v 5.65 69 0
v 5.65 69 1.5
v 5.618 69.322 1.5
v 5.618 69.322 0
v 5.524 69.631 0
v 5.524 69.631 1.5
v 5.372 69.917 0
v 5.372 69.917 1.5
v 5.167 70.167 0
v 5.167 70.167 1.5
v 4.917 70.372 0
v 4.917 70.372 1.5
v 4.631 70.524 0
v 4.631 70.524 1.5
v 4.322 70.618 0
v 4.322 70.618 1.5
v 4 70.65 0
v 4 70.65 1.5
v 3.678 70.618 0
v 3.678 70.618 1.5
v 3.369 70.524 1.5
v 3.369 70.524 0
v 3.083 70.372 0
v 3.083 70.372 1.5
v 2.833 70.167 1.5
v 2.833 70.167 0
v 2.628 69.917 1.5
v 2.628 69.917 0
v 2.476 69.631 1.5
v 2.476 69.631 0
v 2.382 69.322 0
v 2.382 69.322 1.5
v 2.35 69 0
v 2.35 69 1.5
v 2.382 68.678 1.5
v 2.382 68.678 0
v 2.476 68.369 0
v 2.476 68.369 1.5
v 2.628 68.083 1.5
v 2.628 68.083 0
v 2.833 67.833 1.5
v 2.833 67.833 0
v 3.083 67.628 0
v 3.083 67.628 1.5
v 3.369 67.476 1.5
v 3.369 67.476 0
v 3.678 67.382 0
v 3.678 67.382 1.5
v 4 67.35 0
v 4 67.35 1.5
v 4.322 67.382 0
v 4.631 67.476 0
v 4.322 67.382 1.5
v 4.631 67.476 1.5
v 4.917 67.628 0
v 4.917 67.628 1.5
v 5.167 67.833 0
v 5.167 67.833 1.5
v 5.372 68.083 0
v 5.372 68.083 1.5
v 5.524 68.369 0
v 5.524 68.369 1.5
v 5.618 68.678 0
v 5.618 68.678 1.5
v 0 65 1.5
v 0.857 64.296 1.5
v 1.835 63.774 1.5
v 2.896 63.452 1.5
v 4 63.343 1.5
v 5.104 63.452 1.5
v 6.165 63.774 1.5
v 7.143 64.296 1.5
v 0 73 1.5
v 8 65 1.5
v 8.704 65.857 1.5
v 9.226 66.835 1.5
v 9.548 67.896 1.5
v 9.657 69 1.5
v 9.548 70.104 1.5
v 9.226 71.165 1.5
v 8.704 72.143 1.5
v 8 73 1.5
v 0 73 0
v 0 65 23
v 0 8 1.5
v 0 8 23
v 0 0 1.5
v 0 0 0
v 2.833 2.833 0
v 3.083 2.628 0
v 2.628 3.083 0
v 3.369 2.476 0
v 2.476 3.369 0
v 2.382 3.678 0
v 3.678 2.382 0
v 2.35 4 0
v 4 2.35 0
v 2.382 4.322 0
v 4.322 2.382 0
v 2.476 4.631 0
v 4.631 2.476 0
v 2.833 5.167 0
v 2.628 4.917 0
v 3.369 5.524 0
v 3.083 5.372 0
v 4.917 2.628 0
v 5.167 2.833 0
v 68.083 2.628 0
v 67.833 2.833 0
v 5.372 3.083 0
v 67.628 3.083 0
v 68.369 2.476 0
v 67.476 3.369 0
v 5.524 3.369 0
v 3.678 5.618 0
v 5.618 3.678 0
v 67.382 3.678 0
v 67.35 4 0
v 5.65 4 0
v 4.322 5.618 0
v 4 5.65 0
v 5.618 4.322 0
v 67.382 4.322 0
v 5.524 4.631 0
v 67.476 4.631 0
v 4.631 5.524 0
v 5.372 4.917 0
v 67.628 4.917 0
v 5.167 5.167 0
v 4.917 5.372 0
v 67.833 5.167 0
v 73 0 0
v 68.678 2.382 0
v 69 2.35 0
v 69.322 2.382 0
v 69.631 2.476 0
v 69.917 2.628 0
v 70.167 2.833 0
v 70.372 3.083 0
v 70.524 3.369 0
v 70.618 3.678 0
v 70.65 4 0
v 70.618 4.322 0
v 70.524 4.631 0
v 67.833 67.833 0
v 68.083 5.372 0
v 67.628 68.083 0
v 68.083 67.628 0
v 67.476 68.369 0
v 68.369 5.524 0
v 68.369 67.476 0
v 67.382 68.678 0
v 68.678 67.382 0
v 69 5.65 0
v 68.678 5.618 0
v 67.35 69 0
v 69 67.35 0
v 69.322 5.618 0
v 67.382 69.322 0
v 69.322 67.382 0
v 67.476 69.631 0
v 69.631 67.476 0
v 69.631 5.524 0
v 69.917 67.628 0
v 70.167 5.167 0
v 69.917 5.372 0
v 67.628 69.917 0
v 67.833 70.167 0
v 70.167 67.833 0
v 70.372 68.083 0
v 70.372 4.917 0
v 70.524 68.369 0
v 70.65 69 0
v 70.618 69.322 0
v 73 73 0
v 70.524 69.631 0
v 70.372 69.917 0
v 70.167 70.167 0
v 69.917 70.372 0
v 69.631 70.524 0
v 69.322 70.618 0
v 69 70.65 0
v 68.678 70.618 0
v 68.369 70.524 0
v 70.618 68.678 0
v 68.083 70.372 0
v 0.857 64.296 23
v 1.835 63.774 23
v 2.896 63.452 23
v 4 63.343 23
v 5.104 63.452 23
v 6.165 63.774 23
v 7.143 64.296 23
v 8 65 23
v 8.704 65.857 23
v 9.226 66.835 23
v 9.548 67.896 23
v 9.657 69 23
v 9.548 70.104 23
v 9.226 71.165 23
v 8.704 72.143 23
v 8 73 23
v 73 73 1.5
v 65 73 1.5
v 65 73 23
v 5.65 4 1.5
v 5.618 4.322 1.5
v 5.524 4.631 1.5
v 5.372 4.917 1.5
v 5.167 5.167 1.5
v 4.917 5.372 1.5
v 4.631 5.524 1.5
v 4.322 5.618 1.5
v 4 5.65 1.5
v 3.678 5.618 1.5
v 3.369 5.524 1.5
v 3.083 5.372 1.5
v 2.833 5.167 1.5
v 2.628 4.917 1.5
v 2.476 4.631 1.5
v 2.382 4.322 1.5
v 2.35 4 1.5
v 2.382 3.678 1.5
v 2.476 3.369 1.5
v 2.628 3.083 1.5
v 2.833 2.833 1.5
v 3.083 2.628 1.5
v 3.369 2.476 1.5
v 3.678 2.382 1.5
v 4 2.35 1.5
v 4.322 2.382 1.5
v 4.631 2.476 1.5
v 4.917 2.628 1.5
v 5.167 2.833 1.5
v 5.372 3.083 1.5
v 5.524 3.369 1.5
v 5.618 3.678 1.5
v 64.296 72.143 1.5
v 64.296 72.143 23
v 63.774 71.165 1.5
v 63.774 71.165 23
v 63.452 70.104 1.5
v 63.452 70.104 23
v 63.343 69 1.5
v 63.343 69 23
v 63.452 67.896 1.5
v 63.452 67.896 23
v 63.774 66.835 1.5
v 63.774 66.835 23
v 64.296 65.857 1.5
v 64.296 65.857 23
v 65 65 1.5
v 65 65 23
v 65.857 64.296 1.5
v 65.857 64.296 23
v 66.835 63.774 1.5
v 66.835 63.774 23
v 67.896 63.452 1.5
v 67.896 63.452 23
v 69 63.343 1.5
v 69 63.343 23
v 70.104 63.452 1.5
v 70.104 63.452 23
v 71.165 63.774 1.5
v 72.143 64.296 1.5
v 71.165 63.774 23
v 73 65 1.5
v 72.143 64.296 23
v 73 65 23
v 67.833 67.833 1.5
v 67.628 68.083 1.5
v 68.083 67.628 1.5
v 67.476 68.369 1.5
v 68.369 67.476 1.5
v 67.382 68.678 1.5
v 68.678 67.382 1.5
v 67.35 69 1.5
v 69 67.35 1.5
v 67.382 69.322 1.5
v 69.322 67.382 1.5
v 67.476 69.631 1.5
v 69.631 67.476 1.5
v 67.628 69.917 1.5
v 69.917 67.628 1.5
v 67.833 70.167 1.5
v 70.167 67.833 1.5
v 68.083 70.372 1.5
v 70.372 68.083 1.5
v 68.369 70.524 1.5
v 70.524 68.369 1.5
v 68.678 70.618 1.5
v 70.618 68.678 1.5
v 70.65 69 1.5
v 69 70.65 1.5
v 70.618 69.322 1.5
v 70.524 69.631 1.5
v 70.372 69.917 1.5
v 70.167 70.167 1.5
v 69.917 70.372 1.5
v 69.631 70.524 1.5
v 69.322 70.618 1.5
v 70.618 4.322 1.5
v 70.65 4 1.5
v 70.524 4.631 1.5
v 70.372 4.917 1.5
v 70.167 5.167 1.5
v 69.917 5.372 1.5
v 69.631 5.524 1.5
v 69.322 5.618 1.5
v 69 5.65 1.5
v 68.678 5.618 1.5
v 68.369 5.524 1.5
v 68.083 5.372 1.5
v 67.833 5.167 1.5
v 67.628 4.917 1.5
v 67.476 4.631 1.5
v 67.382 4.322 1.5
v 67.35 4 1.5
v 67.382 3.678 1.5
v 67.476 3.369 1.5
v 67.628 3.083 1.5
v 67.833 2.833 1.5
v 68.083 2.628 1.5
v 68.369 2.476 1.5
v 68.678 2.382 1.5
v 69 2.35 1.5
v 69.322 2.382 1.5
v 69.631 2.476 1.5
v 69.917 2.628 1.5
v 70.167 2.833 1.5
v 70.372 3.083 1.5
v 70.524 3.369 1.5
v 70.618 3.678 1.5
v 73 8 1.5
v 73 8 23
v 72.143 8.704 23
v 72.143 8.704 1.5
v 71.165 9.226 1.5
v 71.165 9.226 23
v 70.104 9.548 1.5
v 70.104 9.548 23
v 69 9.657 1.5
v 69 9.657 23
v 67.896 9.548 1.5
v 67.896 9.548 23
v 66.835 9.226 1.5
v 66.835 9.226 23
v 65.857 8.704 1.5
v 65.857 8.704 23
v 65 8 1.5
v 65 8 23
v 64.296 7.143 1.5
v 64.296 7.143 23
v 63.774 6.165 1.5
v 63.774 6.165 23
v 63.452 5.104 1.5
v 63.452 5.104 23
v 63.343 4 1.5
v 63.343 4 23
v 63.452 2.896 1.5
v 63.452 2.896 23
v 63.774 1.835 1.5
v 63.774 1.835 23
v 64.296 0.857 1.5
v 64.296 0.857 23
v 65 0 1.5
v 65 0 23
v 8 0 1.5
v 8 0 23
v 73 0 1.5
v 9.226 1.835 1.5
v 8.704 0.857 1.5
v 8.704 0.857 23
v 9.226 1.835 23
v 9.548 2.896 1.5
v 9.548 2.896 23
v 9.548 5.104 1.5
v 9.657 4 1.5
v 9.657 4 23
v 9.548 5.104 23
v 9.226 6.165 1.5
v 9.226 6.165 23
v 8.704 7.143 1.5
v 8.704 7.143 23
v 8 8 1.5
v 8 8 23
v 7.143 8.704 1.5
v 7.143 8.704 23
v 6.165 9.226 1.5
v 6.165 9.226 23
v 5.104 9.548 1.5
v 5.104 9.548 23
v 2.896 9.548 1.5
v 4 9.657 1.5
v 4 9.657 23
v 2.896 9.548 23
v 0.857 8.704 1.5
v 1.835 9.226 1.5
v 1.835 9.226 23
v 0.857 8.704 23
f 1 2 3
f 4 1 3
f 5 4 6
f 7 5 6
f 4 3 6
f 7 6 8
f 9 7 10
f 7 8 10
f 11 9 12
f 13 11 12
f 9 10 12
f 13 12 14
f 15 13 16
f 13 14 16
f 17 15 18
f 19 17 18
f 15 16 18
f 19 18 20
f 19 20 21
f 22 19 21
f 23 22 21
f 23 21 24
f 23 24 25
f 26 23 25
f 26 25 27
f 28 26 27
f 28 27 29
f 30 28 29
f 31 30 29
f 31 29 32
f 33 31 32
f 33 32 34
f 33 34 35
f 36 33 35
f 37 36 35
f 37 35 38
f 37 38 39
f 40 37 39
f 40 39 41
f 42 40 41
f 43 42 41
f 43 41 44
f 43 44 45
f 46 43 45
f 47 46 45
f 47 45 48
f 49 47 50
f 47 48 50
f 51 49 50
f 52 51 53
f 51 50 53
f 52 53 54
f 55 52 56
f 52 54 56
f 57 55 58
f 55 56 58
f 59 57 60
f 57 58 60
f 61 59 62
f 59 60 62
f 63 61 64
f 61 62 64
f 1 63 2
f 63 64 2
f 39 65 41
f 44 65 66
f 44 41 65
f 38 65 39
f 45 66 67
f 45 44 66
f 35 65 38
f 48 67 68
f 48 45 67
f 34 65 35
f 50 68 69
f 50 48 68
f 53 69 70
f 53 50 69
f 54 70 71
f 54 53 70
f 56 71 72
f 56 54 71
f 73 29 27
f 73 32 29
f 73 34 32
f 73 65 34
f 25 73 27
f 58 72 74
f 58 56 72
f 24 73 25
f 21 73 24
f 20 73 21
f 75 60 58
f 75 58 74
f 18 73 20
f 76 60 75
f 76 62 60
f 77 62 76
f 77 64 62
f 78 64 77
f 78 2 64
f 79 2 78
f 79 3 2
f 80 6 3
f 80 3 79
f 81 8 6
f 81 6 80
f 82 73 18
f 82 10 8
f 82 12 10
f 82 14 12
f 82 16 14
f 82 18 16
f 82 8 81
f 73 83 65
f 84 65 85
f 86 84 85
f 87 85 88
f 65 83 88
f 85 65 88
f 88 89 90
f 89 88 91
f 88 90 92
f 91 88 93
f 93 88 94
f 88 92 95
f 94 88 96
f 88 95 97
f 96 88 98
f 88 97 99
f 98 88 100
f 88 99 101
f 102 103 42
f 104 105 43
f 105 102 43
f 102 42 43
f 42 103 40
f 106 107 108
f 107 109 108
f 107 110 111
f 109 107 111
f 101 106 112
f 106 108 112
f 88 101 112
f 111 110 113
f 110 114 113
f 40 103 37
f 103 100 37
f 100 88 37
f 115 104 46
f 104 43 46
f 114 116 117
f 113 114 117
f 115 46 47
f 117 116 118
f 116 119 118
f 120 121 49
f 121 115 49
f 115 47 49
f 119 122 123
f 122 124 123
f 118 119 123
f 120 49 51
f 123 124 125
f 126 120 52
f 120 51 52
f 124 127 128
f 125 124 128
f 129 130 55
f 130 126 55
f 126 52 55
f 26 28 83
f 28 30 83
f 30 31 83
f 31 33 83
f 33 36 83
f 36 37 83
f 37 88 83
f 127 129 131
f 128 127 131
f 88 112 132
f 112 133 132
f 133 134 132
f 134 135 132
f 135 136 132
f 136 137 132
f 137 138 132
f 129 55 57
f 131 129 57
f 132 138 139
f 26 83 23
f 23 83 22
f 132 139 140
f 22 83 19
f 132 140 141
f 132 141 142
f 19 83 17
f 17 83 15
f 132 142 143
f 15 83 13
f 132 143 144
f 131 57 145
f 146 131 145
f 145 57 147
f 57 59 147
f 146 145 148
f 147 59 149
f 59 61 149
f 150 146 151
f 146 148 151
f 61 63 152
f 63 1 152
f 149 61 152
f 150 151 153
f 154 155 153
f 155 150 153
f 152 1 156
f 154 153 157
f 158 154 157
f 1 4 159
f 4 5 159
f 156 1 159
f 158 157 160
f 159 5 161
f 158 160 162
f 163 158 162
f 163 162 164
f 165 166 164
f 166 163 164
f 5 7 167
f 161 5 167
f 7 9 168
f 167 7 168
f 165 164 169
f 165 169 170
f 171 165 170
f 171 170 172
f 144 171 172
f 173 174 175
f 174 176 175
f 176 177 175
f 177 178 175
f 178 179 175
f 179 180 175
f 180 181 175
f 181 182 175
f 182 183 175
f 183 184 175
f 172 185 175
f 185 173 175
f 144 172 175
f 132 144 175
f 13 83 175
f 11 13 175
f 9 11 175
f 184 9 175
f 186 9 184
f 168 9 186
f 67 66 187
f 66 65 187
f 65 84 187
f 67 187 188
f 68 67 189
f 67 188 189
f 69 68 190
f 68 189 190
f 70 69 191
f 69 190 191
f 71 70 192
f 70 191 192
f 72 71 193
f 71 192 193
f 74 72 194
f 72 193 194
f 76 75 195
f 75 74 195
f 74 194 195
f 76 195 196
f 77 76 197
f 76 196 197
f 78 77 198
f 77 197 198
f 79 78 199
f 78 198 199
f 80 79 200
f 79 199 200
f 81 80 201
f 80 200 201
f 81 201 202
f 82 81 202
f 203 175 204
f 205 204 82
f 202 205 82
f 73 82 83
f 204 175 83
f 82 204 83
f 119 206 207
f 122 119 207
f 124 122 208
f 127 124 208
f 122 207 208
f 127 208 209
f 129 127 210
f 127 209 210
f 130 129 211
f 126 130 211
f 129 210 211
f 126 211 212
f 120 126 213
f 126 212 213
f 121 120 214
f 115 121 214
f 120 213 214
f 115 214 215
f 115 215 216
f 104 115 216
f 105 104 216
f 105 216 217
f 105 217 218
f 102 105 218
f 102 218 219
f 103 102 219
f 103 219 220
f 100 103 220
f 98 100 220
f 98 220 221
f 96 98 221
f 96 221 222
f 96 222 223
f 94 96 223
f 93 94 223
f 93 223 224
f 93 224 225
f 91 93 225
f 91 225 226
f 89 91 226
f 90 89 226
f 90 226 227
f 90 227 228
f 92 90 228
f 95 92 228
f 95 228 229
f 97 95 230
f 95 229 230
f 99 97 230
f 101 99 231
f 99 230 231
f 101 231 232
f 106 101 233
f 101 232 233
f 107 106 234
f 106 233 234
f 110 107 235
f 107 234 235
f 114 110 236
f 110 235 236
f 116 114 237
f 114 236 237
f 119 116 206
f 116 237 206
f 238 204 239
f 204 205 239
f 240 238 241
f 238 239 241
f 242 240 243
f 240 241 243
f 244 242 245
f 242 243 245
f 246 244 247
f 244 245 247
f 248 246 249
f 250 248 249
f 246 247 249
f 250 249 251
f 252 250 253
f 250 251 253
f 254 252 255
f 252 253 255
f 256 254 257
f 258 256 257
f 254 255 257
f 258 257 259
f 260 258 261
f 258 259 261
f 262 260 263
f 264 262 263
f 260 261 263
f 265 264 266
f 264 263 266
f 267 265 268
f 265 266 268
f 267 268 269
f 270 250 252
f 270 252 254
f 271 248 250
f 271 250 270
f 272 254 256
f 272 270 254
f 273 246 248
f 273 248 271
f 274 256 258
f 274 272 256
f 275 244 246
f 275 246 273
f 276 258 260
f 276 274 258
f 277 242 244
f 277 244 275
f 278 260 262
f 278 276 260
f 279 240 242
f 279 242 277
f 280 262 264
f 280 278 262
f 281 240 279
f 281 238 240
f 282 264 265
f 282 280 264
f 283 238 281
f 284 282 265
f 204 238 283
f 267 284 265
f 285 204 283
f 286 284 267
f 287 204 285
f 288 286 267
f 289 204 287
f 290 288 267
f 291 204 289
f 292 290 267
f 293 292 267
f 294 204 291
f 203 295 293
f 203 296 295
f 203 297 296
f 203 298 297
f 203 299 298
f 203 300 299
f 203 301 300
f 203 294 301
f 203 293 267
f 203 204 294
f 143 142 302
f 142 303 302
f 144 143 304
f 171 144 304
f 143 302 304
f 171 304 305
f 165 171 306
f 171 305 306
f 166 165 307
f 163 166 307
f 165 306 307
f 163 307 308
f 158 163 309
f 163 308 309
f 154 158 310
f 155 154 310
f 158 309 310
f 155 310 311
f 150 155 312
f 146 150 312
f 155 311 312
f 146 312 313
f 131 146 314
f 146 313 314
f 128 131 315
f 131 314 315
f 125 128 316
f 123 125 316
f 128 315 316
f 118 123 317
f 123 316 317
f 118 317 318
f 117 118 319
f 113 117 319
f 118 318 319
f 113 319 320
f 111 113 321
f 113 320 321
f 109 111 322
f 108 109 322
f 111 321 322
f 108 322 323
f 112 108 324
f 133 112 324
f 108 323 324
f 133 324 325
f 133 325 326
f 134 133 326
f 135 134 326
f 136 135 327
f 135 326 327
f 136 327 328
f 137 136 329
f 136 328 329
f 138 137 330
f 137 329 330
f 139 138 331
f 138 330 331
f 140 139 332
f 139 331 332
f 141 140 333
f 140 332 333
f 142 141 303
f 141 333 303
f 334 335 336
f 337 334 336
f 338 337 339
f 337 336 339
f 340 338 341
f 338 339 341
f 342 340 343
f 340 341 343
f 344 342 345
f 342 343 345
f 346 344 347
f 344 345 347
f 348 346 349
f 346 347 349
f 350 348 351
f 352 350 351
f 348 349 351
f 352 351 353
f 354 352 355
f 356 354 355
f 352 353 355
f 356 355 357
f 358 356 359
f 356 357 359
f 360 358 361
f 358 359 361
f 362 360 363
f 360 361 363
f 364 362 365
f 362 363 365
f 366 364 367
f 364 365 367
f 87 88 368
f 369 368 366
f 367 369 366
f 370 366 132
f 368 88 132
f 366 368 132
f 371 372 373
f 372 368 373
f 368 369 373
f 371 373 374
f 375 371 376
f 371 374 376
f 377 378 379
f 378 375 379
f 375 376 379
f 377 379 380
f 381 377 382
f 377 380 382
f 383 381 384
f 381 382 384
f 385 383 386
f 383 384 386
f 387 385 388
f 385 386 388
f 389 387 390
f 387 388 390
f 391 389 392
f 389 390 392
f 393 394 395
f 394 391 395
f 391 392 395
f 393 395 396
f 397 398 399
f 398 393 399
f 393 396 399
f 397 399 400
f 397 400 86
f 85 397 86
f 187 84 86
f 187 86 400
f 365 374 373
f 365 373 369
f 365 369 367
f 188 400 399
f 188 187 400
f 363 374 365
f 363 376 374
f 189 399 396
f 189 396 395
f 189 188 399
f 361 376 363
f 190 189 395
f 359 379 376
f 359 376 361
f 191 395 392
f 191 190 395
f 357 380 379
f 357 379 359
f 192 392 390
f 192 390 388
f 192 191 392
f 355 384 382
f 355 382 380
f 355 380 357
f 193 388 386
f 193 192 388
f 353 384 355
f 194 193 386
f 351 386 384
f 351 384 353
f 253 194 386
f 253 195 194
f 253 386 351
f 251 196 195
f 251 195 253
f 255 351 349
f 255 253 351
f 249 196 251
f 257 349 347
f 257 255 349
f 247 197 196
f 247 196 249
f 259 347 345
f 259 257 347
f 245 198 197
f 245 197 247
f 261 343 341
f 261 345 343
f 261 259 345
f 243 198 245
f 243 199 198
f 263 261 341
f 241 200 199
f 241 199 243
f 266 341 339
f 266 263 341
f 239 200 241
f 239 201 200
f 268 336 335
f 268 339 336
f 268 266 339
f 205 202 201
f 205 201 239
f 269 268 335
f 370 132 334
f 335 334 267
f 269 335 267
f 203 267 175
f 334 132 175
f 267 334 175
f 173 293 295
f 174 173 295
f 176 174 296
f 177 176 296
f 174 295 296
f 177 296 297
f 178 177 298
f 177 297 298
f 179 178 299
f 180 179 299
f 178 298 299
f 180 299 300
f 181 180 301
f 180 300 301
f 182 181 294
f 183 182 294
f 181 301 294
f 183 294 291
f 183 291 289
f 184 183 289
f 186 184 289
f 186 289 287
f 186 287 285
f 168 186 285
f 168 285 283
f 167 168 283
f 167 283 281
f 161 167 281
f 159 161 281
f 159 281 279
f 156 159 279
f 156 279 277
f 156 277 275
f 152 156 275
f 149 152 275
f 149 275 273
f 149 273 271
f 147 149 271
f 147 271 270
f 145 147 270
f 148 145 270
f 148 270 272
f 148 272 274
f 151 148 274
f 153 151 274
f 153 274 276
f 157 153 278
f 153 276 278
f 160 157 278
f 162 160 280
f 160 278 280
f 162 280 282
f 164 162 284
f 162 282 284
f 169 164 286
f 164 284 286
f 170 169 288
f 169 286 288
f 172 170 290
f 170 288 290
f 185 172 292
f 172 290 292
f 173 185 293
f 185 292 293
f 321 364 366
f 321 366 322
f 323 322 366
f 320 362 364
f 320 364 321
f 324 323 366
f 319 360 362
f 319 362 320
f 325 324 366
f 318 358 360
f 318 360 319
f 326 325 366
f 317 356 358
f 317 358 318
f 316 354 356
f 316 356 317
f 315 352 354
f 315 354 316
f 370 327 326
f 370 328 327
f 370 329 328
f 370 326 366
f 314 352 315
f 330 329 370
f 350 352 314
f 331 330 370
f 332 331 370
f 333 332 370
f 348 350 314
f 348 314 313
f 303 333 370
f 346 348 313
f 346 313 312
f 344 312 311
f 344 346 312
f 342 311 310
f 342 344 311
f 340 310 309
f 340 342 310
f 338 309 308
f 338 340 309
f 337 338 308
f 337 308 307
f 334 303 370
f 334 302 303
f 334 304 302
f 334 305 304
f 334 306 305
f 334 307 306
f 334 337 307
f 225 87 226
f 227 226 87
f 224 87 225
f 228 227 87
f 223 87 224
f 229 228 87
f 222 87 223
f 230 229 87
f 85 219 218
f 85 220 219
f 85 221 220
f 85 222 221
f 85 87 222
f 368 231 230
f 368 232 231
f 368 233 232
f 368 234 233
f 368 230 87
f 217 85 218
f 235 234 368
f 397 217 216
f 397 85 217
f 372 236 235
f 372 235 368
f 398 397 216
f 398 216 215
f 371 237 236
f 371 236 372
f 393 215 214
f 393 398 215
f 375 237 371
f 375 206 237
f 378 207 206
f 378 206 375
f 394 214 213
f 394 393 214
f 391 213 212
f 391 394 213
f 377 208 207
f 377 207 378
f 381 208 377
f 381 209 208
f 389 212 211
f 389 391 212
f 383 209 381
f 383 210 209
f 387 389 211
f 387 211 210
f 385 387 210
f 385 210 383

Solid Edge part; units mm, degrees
sketch "Sketch1" plane through (0, 0, 0) normal (0, 0, 1) x (1, 0, 0)
  line L0 (0, 0) -> (73, 0)
  line L1 (73, 0) -> (73, 73)
  line L2 (73, 73) -> (0, 73)
  line L3 (0, 73) -> (0, 0)
  dimension "D1" = 73
  dimension "D2" = 73
extrude "Protrusion1" add sketch "Sketch1" along normal blind 23
sketch "Sketch2" plane through (36.5, 36.5, 23) normal (0, 0, 1) x (1, 0, 0)
  circle A0 centre (32.5, 32.5) radius 1.65
  circle A1 centre (32.5, -32.5) radius 1.65
  circle A2 centre (-32.5, -32.5) radius 1.65
  circle A3 centre (-32.5, 32.5) radius 1.65
  dimension "D1" = 3.3
  dimension "D2" = 3.3
  dimension "D3" = 3.3
  dimension "D4" = 3.3
extrude "ExtrudedCutout_1" cut sketch "Sketch2" against normal blind 23
sketch "Sketch3" plane through (36.5, 36.5, 23) normal (0, 0, 1) x (1, 0, 0)
  circle A0 centre (32.5, 32.5) radius 5.6569
  circle A1 centre (-32.5, -32.5) radius 5.6569
  circle A2 centre (32.5, -32.5) radius 5.6569
  circle A3 centre (-32.5, 32.5) radius 5.6569
  dimension "D1" = 11.3137
  dimension "D2" = 11.3137
  dimension "D3" = 11.3137
  dimension "D4" = 11.3137
extrude "ExtrudedCutout_2" cut sketch "Sketch3" against normal blind 21.5
